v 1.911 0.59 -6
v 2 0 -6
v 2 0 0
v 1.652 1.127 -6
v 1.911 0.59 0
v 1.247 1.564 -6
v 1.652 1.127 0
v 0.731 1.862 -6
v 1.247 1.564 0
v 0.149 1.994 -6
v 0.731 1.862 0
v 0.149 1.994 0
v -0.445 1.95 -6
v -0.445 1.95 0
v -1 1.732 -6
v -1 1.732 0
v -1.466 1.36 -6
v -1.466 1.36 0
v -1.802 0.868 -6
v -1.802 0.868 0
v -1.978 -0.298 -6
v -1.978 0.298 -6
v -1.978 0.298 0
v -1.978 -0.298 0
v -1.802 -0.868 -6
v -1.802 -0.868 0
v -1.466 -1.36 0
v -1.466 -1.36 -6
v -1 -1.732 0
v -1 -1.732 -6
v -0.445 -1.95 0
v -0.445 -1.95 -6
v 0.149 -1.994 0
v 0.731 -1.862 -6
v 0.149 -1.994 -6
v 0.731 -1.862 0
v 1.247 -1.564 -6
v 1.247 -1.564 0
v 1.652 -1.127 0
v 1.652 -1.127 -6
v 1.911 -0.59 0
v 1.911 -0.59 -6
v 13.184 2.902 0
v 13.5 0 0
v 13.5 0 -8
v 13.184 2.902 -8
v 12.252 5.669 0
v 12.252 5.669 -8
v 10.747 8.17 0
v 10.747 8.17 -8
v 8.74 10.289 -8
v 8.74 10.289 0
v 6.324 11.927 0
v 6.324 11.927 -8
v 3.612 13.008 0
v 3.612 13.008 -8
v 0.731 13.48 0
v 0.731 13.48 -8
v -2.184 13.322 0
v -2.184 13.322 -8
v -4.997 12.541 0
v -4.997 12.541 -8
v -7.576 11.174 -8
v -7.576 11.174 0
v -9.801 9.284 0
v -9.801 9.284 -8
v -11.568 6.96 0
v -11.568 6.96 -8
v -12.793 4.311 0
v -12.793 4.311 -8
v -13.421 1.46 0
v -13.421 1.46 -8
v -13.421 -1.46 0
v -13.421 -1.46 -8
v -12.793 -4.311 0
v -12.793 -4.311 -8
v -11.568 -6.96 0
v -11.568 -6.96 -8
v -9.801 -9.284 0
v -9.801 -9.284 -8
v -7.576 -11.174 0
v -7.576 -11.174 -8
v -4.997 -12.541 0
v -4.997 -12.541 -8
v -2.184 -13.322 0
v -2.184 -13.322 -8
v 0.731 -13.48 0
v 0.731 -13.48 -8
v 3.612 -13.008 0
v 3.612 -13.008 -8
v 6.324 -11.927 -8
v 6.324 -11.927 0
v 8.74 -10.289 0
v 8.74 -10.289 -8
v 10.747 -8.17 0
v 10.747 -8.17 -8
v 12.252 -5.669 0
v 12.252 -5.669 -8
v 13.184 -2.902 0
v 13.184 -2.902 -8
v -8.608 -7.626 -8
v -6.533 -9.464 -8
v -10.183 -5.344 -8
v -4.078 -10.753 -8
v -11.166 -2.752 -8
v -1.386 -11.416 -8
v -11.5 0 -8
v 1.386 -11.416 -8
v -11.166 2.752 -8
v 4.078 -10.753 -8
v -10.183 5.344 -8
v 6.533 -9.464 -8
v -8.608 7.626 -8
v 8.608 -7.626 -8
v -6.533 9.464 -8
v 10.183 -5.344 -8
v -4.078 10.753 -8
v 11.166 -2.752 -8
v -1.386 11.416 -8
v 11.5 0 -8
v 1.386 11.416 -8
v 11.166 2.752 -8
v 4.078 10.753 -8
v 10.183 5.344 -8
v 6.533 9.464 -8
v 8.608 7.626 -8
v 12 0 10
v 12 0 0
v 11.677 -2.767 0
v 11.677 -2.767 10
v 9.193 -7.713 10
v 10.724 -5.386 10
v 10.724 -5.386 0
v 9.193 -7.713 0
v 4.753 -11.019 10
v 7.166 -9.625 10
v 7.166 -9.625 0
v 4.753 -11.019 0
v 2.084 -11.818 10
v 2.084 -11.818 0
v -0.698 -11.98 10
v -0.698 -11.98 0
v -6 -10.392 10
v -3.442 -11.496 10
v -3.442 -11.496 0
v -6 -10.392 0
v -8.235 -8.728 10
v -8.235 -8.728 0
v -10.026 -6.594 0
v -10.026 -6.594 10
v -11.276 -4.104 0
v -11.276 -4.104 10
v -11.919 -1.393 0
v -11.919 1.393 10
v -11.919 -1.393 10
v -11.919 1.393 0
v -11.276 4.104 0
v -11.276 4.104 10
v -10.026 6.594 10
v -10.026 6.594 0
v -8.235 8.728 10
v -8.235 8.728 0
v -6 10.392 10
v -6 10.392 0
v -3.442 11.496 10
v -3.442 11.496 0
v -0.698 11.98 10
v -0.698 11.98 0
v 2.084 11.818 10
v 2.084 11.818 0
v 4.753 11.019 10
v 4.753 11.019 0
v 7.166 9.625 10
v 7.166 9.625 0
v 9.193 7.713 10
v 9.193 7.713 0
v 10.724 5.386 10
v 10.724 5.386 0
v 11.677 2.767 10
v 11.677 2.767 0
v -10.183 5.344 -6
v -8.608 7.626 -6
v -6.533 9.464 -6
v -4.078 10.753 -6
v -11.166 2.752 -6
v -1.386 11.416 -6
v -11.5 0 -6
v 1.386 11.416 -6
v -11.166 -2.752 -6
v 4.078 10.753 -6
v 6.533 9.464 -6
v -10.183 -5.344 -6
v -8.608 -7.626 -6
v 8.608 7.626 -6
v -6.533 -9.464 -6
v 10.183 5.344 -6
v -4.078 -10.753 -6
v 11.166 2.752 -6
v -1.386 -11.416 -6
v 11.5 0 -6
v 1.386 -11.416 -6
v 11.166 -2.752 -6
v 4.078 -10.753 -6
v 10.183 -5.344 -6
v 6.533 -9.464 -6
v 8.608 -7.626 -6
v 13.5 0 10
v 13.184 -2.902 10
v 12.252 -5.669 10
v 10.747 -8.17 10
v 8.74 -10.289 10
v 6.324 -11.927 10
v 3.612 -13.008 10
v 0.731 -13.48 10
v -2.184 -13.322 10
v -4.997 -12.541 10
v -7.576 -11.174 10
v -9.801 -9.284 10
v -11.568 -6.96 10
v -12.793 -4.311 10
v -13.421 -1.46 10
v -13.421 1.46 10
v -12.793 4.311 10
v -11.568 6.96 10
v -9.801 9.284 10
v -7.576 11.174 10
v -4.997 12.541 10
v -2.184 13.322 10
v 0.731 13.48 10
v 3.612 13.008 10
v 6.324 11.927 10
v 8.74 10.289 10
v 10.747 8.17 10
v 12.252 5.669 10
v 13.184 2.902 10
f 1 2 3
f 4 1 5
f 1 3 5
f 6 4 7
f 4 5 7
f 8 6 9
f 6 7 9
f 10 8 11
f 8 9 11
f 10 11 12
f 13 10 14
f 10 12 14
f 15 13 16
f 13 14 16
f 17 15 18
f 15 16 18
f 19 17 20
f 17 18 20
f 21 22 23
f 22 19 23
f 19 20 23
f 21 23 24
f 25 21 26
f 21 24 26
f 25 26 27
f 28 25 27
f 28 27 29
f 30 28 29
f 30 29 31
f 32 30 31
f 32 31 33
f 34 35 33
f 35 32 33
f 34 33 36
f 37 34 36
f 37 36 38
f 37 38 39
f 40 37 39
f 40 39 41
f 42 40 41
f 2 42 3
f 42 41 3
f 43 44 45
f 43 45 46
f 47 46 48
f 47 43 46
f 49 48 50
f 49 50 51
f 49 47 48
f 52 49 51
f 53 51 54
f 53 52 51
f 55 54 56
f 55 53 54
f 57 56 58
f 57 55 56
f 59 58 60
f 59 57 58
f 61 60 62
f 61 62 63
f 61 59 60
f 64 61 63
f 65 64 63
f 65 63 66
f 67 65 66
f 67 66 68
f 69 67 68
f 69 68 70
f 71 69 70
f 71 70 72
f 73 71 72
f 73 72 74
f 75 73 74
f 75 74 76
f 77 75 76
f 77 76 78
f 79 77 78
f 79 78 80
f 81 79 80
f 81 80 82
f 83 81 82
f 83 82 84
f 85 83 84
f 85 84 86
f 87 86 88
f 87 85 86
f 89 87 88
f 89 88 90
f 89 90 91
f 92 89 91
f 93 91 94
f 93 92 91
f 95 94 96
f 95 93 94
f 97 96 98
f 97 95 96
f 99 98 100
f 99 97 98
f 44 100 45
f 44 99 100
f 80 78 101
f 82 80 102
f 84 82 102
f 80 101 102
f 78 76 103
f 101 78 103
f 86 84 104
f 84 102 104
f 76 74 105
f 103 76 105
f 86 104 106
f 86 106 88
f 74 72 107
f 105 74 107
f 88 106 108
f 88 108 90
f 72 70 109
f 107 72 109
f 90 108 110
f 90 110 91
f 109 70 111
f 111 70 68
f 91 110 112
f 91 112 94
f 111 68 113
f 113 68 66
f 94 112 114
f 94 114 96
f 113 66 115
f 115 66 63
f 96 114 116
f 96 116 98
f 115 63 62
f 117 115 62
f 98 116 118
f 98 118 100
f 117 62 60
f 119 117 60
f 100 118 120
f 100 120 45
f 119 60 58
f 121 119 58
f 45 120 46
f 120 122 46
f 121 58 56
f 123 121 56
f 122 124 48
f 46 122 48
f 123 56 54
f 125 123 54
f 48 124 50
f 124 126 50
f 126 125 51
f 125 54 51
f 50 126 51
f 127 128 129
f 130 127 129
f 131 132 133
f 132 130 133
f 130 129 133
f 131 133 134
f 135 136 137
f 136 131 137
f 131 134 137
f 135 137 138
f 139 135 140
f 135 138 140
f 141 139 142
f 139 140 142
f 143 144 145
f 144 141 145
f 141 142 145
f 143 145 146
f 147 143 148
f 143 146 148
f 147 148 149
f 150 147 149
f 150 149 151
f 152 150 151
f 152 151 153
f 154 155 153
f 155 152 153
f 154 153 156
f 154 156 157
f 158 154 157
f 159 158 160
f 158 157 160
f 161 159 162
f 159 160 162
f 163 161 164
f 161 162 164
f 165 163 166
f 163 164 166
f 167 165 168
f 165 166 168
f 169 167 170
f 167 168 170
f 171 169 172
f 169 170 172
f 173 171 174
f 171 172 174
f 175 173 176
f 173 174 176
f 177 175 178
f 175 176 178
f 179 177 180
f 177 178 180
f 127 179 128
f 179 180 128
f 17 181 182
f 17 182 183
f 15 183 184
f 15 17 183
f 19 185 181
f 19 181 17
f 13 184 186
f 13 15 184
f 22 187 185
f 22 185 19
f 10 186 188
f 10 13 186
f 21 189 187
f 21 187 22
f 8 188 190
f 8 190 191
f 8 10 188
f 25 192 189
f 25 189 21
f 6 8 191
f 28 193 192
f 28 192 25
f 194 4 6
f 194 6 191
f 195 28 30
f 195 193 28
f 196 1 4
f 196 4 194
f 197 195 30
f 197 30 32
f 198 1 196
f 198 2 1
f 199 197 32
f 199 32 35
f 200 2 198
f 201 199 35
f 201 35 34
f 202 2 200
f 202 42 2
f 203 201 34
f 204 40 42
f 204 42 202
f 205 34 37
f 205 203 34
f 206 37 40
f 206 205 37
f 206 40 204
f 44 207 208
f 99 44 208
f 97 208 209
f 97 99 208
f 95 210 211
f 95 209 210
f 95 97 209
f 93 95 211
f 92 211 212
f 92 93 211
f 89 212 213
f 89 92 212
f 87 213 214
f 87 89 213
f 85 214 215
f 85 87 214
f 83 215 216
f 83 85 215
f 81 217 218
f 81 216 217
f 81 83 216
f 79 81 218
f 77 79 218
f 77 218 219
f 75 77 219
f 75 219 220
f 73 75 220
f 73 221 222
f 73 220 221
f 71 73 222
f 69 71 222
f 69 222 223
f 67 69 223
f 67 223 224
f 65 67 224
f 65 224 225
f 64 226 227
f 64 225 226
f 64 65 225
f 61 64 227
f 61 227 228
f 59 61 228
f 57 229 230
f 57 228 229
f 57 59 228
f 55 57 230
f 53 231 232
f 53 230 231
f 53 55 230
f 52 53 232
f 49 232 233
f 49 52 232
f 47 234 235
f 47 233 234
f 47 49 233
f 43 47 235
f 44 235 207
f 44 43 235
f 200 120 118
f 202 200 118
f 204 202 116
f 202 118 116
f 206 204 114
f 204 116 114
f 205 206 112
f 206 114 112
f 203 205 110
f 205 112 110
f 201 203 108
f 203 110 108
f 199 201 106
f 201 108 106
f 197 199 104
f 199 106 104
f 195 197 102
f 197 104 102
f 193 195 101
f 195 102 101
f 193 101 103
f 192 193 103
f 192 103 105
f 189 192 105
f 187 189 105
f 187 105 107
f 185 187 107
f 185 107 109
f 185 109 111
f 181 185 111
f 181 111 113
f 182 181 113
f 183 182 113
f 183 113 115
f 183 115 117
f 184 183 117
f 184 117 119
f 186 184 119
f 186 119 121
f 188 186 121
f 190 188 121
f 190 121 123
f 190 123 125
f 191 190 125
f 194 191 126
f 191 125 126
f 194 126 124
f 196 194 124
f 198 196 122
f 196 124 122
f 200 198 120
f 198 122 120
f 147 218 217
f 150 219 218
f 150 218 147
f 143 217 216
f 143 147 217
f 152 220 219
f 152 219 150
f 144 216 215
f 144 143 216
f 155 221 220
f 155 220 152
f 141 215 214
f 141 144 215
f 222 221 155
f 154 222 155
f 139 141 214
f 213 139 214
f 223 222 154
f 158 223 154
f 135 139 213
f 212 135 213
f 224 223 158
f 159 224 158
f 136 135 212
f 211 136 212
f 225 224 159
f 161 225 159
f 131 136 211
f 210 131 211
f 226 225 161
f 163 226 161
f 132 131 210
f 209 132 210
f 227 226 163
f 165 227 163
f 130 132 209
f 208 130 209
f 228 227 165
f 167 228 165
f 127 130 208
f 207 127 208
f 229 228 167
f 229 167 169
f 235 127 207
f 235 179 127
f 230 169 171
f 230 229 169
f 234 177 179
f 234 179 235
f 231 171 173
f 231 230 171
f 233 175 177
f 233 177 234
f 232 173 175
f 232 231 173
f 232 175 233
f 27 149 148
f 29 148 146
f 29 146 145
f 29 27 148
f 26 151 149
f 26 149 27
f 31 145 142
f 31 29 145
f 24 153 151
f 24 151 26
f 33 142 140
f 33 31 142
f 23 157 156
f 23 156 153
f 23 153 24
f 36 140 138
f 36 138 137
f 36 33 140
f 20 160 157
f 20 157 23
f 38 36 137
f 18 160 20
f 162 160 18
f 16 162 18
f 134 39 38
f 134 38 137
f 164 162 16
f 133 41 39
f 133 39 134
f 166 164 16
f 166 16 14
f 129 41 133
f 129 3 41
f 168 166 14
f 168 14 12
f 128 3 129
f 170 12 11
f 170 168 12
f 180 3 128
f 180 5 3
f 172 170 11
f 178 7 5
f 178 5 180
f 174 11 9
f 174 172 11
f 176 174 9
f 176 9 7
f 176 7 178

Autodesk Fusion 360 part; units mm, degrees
sketch "Skizze1" plane through (0, 0, 0) normal (0, 0, 1) x (1, 0, 0)
  circle A0 centre (0, 0) radius 13.5
  circle A1 centre (0, 0) radius 12
  circle A2 centre (0, 0) radius 2
  dimension "d1" = 27
  dimension "d2" = 24
  dimension "d3" = 4
extrude "Extrusion1" add sketch "Skizze1" along normal blind 10 contours A0
extrude "Extrusion2" add sketch "Skizze1" against normal blind 8 contours A0 | A1
sketch "Skizze2" plane through (0, 0, -8) normal (0, 0, -1) x (1, 0, 0)
  circle A0 centre (0, 0) radius 2
  circle A1 centre (0, 0) radius 13.5
  circle A2 centre (0, 0) radius 13.5
  circle A3 centre (0, 0) radius 11.5
  dimension "d8" = -2
extrude "Extrusion3" cut sketch "Skizze2" against normal blind 2 contours A3
